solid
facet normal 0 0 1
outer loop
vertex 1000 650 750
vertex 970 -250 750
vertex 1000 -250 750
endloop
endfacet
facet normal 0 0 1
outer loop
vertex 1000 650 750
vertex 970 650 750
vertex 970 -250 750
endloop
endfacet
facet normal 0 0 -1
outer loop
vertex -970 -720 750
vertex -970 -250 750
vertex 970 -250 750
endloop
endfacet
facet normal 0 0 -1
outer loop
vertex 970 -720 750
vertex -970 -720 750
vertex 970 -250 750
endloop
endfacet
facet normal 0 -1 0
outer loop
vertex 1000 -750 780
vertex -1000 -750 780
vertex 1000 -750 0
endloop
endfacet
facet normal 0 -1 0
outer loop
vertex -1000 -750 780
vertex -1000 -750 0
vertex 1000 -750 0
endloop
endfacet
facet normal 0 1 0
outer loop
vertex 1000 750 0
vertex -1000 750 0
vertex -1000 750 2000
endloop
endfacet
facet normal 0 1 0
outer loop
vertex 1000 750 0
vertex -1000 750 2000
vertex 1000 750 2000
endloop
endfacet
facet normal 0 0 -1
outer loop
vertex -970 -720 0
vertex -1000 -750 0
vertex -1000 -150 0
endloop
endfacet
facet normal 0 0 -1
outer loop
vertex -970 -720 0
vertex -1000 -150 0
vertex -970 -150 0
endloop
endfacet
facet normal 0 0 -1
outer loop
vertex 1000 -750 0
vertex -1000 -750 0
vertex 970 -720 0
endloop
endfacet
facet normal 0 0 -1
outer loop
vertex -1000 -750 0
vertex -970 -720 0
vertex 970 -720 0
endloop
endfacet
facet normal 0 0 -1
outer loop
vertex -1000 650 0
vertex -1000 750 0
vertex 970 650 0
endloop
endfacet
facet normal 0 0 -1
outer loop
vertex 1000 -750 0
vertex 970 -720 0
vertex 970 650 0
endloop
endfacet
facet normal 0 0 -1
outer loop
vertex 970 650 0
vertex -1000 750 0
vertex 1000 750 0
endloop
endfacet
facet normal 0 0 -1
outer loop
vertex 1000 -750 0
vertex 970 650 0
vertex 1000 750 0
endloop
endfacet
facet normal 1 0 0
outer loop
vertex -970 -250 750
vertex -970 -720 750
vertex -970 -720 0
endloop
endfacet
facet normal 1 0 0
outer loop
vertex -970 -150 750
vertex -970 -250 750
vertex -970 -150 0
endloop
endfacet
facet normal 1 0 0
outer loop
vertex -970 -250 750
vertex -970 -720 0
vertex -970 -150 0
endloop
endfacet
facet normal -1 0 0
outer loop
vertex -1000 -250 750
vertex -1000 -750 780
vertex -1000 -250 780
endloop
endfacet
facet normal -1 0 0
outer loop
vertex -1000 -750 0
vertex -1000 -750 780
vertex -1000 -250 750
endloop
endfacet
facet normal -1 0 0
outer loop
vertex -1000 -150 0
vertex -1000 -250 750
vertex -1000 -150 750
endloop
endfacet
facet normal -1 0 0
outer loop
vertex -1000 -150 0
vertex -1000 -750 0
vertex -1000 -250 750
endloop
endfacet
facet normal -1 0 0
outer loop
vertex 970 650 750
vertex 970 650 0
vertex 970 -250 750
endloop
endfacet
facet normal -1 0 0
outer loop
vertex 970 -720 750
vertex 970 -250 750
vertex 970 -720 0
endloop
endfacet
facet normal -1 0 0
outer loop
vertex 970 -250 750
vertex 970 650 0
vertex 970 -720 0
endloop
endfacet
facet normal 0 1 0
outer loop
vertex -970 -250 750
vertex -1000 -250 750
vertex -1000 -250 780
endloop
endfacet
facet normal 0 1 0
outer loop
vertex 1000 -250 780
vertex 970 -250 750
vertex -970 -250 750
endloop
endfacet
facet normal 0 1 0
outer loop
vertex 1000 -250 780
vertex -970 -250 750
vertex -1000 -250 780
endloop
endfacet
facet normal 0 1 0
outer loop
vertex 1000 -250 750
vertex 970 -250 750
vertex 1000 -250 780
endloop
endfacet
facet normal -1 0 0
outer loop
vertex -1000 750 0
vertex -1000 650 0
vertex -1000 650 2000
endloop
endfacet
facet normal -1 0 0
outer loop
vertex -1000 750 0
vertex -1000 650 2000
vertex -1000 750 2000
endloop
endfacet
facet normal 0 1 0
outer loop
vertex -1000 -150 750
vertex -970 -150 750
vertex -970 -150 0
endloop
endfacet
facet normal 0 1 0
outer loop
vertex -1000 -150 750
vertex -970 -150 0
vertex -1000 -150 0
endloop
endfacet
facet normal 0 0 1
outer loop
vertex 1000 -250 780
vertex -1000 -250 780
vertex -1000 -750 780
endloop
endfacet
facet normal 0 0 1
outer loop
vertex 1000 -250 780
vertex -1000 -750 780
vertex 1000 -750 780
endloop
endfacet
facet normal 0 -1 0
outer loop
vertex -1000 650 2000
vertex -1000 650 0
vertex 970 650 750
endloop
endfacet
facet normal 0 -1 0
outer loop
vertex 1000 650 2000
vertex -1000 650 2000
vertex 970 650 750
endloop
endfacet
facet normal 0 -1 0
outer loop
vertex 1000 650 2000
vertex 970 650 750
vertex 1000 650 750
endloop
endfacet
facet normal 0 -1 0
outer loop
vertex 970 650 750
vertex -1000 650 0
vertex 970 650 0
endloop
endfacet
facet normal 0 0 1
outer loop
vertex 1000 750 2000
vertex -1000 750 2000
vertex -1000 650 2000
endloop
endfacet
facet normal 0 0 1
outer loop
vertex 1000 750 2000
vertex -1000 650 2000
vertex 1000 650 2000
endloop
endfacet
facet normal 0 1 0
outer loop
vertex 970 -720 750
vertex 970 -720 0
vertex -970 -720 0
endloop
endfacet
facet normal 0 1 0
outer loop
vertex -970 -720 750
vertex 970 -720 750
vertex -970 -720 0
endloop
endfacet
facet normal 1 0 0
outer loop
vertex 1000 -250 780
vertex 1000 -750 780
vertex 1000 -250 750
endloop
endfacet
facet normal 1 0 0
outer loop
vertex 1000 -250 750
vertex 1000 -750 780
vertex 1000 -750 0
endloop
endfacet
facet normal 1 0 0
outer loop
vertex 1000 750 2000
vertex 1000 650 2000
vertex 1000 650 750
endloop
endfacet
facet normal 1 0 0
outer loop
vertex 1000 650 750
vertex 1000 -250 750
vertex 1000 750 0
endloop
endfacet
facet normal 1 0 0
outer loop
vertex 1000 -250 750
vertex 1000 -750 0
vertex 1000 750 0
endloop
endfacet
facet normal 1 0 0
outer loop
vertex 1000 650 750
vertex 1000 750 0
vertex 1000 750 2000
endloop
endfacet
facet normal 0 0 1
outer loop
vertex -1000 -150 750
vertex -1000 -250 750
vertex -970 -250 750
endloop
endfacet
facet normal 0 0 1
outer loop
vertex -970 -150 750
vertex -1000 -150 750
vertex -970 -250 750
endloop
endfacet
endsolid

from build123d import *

# Parameters (mm, degrees)
F1_W     = 2000
F1_H     = 100
F2_DEPTH = 2000
F4_DEPTH = 750
F5_W     = 2000
F5_H     = 500
F6_DEPTH = 30


with BuildPart() as f2:
    # F1 (on Top) → F2 (new body)
    with BuildSketch(Plane.XY):
        with Locations((0, 700)):
            Rectangle(F1_W, F1_H)
    extrude(amount=F2_DEPTH)

    # F3 (on Top) → F4 (join)
    with BuildSketch(Plane.XY):
        Polygon((1000, -750), (1000, 750), (970, 750), (970, -720), (-970, -720), (-970, -150), (-1000, -150), (-1000, -750), align=None)
    extrude(amount=F4_DEPTH)

    # F5 (on face) → F6 (join)
    with BuildSketch(Plane.XY.offset(750)):
        with Locations((0, -500)):
            Rectangle(F5_W, F5_H)
    extrude(amount=F6_DEPTH)


with BuildPart() as f7_1:
    # F7: instance of F2
    add(f2.part.mirror(Plane.YZ))


solid = f2.part
